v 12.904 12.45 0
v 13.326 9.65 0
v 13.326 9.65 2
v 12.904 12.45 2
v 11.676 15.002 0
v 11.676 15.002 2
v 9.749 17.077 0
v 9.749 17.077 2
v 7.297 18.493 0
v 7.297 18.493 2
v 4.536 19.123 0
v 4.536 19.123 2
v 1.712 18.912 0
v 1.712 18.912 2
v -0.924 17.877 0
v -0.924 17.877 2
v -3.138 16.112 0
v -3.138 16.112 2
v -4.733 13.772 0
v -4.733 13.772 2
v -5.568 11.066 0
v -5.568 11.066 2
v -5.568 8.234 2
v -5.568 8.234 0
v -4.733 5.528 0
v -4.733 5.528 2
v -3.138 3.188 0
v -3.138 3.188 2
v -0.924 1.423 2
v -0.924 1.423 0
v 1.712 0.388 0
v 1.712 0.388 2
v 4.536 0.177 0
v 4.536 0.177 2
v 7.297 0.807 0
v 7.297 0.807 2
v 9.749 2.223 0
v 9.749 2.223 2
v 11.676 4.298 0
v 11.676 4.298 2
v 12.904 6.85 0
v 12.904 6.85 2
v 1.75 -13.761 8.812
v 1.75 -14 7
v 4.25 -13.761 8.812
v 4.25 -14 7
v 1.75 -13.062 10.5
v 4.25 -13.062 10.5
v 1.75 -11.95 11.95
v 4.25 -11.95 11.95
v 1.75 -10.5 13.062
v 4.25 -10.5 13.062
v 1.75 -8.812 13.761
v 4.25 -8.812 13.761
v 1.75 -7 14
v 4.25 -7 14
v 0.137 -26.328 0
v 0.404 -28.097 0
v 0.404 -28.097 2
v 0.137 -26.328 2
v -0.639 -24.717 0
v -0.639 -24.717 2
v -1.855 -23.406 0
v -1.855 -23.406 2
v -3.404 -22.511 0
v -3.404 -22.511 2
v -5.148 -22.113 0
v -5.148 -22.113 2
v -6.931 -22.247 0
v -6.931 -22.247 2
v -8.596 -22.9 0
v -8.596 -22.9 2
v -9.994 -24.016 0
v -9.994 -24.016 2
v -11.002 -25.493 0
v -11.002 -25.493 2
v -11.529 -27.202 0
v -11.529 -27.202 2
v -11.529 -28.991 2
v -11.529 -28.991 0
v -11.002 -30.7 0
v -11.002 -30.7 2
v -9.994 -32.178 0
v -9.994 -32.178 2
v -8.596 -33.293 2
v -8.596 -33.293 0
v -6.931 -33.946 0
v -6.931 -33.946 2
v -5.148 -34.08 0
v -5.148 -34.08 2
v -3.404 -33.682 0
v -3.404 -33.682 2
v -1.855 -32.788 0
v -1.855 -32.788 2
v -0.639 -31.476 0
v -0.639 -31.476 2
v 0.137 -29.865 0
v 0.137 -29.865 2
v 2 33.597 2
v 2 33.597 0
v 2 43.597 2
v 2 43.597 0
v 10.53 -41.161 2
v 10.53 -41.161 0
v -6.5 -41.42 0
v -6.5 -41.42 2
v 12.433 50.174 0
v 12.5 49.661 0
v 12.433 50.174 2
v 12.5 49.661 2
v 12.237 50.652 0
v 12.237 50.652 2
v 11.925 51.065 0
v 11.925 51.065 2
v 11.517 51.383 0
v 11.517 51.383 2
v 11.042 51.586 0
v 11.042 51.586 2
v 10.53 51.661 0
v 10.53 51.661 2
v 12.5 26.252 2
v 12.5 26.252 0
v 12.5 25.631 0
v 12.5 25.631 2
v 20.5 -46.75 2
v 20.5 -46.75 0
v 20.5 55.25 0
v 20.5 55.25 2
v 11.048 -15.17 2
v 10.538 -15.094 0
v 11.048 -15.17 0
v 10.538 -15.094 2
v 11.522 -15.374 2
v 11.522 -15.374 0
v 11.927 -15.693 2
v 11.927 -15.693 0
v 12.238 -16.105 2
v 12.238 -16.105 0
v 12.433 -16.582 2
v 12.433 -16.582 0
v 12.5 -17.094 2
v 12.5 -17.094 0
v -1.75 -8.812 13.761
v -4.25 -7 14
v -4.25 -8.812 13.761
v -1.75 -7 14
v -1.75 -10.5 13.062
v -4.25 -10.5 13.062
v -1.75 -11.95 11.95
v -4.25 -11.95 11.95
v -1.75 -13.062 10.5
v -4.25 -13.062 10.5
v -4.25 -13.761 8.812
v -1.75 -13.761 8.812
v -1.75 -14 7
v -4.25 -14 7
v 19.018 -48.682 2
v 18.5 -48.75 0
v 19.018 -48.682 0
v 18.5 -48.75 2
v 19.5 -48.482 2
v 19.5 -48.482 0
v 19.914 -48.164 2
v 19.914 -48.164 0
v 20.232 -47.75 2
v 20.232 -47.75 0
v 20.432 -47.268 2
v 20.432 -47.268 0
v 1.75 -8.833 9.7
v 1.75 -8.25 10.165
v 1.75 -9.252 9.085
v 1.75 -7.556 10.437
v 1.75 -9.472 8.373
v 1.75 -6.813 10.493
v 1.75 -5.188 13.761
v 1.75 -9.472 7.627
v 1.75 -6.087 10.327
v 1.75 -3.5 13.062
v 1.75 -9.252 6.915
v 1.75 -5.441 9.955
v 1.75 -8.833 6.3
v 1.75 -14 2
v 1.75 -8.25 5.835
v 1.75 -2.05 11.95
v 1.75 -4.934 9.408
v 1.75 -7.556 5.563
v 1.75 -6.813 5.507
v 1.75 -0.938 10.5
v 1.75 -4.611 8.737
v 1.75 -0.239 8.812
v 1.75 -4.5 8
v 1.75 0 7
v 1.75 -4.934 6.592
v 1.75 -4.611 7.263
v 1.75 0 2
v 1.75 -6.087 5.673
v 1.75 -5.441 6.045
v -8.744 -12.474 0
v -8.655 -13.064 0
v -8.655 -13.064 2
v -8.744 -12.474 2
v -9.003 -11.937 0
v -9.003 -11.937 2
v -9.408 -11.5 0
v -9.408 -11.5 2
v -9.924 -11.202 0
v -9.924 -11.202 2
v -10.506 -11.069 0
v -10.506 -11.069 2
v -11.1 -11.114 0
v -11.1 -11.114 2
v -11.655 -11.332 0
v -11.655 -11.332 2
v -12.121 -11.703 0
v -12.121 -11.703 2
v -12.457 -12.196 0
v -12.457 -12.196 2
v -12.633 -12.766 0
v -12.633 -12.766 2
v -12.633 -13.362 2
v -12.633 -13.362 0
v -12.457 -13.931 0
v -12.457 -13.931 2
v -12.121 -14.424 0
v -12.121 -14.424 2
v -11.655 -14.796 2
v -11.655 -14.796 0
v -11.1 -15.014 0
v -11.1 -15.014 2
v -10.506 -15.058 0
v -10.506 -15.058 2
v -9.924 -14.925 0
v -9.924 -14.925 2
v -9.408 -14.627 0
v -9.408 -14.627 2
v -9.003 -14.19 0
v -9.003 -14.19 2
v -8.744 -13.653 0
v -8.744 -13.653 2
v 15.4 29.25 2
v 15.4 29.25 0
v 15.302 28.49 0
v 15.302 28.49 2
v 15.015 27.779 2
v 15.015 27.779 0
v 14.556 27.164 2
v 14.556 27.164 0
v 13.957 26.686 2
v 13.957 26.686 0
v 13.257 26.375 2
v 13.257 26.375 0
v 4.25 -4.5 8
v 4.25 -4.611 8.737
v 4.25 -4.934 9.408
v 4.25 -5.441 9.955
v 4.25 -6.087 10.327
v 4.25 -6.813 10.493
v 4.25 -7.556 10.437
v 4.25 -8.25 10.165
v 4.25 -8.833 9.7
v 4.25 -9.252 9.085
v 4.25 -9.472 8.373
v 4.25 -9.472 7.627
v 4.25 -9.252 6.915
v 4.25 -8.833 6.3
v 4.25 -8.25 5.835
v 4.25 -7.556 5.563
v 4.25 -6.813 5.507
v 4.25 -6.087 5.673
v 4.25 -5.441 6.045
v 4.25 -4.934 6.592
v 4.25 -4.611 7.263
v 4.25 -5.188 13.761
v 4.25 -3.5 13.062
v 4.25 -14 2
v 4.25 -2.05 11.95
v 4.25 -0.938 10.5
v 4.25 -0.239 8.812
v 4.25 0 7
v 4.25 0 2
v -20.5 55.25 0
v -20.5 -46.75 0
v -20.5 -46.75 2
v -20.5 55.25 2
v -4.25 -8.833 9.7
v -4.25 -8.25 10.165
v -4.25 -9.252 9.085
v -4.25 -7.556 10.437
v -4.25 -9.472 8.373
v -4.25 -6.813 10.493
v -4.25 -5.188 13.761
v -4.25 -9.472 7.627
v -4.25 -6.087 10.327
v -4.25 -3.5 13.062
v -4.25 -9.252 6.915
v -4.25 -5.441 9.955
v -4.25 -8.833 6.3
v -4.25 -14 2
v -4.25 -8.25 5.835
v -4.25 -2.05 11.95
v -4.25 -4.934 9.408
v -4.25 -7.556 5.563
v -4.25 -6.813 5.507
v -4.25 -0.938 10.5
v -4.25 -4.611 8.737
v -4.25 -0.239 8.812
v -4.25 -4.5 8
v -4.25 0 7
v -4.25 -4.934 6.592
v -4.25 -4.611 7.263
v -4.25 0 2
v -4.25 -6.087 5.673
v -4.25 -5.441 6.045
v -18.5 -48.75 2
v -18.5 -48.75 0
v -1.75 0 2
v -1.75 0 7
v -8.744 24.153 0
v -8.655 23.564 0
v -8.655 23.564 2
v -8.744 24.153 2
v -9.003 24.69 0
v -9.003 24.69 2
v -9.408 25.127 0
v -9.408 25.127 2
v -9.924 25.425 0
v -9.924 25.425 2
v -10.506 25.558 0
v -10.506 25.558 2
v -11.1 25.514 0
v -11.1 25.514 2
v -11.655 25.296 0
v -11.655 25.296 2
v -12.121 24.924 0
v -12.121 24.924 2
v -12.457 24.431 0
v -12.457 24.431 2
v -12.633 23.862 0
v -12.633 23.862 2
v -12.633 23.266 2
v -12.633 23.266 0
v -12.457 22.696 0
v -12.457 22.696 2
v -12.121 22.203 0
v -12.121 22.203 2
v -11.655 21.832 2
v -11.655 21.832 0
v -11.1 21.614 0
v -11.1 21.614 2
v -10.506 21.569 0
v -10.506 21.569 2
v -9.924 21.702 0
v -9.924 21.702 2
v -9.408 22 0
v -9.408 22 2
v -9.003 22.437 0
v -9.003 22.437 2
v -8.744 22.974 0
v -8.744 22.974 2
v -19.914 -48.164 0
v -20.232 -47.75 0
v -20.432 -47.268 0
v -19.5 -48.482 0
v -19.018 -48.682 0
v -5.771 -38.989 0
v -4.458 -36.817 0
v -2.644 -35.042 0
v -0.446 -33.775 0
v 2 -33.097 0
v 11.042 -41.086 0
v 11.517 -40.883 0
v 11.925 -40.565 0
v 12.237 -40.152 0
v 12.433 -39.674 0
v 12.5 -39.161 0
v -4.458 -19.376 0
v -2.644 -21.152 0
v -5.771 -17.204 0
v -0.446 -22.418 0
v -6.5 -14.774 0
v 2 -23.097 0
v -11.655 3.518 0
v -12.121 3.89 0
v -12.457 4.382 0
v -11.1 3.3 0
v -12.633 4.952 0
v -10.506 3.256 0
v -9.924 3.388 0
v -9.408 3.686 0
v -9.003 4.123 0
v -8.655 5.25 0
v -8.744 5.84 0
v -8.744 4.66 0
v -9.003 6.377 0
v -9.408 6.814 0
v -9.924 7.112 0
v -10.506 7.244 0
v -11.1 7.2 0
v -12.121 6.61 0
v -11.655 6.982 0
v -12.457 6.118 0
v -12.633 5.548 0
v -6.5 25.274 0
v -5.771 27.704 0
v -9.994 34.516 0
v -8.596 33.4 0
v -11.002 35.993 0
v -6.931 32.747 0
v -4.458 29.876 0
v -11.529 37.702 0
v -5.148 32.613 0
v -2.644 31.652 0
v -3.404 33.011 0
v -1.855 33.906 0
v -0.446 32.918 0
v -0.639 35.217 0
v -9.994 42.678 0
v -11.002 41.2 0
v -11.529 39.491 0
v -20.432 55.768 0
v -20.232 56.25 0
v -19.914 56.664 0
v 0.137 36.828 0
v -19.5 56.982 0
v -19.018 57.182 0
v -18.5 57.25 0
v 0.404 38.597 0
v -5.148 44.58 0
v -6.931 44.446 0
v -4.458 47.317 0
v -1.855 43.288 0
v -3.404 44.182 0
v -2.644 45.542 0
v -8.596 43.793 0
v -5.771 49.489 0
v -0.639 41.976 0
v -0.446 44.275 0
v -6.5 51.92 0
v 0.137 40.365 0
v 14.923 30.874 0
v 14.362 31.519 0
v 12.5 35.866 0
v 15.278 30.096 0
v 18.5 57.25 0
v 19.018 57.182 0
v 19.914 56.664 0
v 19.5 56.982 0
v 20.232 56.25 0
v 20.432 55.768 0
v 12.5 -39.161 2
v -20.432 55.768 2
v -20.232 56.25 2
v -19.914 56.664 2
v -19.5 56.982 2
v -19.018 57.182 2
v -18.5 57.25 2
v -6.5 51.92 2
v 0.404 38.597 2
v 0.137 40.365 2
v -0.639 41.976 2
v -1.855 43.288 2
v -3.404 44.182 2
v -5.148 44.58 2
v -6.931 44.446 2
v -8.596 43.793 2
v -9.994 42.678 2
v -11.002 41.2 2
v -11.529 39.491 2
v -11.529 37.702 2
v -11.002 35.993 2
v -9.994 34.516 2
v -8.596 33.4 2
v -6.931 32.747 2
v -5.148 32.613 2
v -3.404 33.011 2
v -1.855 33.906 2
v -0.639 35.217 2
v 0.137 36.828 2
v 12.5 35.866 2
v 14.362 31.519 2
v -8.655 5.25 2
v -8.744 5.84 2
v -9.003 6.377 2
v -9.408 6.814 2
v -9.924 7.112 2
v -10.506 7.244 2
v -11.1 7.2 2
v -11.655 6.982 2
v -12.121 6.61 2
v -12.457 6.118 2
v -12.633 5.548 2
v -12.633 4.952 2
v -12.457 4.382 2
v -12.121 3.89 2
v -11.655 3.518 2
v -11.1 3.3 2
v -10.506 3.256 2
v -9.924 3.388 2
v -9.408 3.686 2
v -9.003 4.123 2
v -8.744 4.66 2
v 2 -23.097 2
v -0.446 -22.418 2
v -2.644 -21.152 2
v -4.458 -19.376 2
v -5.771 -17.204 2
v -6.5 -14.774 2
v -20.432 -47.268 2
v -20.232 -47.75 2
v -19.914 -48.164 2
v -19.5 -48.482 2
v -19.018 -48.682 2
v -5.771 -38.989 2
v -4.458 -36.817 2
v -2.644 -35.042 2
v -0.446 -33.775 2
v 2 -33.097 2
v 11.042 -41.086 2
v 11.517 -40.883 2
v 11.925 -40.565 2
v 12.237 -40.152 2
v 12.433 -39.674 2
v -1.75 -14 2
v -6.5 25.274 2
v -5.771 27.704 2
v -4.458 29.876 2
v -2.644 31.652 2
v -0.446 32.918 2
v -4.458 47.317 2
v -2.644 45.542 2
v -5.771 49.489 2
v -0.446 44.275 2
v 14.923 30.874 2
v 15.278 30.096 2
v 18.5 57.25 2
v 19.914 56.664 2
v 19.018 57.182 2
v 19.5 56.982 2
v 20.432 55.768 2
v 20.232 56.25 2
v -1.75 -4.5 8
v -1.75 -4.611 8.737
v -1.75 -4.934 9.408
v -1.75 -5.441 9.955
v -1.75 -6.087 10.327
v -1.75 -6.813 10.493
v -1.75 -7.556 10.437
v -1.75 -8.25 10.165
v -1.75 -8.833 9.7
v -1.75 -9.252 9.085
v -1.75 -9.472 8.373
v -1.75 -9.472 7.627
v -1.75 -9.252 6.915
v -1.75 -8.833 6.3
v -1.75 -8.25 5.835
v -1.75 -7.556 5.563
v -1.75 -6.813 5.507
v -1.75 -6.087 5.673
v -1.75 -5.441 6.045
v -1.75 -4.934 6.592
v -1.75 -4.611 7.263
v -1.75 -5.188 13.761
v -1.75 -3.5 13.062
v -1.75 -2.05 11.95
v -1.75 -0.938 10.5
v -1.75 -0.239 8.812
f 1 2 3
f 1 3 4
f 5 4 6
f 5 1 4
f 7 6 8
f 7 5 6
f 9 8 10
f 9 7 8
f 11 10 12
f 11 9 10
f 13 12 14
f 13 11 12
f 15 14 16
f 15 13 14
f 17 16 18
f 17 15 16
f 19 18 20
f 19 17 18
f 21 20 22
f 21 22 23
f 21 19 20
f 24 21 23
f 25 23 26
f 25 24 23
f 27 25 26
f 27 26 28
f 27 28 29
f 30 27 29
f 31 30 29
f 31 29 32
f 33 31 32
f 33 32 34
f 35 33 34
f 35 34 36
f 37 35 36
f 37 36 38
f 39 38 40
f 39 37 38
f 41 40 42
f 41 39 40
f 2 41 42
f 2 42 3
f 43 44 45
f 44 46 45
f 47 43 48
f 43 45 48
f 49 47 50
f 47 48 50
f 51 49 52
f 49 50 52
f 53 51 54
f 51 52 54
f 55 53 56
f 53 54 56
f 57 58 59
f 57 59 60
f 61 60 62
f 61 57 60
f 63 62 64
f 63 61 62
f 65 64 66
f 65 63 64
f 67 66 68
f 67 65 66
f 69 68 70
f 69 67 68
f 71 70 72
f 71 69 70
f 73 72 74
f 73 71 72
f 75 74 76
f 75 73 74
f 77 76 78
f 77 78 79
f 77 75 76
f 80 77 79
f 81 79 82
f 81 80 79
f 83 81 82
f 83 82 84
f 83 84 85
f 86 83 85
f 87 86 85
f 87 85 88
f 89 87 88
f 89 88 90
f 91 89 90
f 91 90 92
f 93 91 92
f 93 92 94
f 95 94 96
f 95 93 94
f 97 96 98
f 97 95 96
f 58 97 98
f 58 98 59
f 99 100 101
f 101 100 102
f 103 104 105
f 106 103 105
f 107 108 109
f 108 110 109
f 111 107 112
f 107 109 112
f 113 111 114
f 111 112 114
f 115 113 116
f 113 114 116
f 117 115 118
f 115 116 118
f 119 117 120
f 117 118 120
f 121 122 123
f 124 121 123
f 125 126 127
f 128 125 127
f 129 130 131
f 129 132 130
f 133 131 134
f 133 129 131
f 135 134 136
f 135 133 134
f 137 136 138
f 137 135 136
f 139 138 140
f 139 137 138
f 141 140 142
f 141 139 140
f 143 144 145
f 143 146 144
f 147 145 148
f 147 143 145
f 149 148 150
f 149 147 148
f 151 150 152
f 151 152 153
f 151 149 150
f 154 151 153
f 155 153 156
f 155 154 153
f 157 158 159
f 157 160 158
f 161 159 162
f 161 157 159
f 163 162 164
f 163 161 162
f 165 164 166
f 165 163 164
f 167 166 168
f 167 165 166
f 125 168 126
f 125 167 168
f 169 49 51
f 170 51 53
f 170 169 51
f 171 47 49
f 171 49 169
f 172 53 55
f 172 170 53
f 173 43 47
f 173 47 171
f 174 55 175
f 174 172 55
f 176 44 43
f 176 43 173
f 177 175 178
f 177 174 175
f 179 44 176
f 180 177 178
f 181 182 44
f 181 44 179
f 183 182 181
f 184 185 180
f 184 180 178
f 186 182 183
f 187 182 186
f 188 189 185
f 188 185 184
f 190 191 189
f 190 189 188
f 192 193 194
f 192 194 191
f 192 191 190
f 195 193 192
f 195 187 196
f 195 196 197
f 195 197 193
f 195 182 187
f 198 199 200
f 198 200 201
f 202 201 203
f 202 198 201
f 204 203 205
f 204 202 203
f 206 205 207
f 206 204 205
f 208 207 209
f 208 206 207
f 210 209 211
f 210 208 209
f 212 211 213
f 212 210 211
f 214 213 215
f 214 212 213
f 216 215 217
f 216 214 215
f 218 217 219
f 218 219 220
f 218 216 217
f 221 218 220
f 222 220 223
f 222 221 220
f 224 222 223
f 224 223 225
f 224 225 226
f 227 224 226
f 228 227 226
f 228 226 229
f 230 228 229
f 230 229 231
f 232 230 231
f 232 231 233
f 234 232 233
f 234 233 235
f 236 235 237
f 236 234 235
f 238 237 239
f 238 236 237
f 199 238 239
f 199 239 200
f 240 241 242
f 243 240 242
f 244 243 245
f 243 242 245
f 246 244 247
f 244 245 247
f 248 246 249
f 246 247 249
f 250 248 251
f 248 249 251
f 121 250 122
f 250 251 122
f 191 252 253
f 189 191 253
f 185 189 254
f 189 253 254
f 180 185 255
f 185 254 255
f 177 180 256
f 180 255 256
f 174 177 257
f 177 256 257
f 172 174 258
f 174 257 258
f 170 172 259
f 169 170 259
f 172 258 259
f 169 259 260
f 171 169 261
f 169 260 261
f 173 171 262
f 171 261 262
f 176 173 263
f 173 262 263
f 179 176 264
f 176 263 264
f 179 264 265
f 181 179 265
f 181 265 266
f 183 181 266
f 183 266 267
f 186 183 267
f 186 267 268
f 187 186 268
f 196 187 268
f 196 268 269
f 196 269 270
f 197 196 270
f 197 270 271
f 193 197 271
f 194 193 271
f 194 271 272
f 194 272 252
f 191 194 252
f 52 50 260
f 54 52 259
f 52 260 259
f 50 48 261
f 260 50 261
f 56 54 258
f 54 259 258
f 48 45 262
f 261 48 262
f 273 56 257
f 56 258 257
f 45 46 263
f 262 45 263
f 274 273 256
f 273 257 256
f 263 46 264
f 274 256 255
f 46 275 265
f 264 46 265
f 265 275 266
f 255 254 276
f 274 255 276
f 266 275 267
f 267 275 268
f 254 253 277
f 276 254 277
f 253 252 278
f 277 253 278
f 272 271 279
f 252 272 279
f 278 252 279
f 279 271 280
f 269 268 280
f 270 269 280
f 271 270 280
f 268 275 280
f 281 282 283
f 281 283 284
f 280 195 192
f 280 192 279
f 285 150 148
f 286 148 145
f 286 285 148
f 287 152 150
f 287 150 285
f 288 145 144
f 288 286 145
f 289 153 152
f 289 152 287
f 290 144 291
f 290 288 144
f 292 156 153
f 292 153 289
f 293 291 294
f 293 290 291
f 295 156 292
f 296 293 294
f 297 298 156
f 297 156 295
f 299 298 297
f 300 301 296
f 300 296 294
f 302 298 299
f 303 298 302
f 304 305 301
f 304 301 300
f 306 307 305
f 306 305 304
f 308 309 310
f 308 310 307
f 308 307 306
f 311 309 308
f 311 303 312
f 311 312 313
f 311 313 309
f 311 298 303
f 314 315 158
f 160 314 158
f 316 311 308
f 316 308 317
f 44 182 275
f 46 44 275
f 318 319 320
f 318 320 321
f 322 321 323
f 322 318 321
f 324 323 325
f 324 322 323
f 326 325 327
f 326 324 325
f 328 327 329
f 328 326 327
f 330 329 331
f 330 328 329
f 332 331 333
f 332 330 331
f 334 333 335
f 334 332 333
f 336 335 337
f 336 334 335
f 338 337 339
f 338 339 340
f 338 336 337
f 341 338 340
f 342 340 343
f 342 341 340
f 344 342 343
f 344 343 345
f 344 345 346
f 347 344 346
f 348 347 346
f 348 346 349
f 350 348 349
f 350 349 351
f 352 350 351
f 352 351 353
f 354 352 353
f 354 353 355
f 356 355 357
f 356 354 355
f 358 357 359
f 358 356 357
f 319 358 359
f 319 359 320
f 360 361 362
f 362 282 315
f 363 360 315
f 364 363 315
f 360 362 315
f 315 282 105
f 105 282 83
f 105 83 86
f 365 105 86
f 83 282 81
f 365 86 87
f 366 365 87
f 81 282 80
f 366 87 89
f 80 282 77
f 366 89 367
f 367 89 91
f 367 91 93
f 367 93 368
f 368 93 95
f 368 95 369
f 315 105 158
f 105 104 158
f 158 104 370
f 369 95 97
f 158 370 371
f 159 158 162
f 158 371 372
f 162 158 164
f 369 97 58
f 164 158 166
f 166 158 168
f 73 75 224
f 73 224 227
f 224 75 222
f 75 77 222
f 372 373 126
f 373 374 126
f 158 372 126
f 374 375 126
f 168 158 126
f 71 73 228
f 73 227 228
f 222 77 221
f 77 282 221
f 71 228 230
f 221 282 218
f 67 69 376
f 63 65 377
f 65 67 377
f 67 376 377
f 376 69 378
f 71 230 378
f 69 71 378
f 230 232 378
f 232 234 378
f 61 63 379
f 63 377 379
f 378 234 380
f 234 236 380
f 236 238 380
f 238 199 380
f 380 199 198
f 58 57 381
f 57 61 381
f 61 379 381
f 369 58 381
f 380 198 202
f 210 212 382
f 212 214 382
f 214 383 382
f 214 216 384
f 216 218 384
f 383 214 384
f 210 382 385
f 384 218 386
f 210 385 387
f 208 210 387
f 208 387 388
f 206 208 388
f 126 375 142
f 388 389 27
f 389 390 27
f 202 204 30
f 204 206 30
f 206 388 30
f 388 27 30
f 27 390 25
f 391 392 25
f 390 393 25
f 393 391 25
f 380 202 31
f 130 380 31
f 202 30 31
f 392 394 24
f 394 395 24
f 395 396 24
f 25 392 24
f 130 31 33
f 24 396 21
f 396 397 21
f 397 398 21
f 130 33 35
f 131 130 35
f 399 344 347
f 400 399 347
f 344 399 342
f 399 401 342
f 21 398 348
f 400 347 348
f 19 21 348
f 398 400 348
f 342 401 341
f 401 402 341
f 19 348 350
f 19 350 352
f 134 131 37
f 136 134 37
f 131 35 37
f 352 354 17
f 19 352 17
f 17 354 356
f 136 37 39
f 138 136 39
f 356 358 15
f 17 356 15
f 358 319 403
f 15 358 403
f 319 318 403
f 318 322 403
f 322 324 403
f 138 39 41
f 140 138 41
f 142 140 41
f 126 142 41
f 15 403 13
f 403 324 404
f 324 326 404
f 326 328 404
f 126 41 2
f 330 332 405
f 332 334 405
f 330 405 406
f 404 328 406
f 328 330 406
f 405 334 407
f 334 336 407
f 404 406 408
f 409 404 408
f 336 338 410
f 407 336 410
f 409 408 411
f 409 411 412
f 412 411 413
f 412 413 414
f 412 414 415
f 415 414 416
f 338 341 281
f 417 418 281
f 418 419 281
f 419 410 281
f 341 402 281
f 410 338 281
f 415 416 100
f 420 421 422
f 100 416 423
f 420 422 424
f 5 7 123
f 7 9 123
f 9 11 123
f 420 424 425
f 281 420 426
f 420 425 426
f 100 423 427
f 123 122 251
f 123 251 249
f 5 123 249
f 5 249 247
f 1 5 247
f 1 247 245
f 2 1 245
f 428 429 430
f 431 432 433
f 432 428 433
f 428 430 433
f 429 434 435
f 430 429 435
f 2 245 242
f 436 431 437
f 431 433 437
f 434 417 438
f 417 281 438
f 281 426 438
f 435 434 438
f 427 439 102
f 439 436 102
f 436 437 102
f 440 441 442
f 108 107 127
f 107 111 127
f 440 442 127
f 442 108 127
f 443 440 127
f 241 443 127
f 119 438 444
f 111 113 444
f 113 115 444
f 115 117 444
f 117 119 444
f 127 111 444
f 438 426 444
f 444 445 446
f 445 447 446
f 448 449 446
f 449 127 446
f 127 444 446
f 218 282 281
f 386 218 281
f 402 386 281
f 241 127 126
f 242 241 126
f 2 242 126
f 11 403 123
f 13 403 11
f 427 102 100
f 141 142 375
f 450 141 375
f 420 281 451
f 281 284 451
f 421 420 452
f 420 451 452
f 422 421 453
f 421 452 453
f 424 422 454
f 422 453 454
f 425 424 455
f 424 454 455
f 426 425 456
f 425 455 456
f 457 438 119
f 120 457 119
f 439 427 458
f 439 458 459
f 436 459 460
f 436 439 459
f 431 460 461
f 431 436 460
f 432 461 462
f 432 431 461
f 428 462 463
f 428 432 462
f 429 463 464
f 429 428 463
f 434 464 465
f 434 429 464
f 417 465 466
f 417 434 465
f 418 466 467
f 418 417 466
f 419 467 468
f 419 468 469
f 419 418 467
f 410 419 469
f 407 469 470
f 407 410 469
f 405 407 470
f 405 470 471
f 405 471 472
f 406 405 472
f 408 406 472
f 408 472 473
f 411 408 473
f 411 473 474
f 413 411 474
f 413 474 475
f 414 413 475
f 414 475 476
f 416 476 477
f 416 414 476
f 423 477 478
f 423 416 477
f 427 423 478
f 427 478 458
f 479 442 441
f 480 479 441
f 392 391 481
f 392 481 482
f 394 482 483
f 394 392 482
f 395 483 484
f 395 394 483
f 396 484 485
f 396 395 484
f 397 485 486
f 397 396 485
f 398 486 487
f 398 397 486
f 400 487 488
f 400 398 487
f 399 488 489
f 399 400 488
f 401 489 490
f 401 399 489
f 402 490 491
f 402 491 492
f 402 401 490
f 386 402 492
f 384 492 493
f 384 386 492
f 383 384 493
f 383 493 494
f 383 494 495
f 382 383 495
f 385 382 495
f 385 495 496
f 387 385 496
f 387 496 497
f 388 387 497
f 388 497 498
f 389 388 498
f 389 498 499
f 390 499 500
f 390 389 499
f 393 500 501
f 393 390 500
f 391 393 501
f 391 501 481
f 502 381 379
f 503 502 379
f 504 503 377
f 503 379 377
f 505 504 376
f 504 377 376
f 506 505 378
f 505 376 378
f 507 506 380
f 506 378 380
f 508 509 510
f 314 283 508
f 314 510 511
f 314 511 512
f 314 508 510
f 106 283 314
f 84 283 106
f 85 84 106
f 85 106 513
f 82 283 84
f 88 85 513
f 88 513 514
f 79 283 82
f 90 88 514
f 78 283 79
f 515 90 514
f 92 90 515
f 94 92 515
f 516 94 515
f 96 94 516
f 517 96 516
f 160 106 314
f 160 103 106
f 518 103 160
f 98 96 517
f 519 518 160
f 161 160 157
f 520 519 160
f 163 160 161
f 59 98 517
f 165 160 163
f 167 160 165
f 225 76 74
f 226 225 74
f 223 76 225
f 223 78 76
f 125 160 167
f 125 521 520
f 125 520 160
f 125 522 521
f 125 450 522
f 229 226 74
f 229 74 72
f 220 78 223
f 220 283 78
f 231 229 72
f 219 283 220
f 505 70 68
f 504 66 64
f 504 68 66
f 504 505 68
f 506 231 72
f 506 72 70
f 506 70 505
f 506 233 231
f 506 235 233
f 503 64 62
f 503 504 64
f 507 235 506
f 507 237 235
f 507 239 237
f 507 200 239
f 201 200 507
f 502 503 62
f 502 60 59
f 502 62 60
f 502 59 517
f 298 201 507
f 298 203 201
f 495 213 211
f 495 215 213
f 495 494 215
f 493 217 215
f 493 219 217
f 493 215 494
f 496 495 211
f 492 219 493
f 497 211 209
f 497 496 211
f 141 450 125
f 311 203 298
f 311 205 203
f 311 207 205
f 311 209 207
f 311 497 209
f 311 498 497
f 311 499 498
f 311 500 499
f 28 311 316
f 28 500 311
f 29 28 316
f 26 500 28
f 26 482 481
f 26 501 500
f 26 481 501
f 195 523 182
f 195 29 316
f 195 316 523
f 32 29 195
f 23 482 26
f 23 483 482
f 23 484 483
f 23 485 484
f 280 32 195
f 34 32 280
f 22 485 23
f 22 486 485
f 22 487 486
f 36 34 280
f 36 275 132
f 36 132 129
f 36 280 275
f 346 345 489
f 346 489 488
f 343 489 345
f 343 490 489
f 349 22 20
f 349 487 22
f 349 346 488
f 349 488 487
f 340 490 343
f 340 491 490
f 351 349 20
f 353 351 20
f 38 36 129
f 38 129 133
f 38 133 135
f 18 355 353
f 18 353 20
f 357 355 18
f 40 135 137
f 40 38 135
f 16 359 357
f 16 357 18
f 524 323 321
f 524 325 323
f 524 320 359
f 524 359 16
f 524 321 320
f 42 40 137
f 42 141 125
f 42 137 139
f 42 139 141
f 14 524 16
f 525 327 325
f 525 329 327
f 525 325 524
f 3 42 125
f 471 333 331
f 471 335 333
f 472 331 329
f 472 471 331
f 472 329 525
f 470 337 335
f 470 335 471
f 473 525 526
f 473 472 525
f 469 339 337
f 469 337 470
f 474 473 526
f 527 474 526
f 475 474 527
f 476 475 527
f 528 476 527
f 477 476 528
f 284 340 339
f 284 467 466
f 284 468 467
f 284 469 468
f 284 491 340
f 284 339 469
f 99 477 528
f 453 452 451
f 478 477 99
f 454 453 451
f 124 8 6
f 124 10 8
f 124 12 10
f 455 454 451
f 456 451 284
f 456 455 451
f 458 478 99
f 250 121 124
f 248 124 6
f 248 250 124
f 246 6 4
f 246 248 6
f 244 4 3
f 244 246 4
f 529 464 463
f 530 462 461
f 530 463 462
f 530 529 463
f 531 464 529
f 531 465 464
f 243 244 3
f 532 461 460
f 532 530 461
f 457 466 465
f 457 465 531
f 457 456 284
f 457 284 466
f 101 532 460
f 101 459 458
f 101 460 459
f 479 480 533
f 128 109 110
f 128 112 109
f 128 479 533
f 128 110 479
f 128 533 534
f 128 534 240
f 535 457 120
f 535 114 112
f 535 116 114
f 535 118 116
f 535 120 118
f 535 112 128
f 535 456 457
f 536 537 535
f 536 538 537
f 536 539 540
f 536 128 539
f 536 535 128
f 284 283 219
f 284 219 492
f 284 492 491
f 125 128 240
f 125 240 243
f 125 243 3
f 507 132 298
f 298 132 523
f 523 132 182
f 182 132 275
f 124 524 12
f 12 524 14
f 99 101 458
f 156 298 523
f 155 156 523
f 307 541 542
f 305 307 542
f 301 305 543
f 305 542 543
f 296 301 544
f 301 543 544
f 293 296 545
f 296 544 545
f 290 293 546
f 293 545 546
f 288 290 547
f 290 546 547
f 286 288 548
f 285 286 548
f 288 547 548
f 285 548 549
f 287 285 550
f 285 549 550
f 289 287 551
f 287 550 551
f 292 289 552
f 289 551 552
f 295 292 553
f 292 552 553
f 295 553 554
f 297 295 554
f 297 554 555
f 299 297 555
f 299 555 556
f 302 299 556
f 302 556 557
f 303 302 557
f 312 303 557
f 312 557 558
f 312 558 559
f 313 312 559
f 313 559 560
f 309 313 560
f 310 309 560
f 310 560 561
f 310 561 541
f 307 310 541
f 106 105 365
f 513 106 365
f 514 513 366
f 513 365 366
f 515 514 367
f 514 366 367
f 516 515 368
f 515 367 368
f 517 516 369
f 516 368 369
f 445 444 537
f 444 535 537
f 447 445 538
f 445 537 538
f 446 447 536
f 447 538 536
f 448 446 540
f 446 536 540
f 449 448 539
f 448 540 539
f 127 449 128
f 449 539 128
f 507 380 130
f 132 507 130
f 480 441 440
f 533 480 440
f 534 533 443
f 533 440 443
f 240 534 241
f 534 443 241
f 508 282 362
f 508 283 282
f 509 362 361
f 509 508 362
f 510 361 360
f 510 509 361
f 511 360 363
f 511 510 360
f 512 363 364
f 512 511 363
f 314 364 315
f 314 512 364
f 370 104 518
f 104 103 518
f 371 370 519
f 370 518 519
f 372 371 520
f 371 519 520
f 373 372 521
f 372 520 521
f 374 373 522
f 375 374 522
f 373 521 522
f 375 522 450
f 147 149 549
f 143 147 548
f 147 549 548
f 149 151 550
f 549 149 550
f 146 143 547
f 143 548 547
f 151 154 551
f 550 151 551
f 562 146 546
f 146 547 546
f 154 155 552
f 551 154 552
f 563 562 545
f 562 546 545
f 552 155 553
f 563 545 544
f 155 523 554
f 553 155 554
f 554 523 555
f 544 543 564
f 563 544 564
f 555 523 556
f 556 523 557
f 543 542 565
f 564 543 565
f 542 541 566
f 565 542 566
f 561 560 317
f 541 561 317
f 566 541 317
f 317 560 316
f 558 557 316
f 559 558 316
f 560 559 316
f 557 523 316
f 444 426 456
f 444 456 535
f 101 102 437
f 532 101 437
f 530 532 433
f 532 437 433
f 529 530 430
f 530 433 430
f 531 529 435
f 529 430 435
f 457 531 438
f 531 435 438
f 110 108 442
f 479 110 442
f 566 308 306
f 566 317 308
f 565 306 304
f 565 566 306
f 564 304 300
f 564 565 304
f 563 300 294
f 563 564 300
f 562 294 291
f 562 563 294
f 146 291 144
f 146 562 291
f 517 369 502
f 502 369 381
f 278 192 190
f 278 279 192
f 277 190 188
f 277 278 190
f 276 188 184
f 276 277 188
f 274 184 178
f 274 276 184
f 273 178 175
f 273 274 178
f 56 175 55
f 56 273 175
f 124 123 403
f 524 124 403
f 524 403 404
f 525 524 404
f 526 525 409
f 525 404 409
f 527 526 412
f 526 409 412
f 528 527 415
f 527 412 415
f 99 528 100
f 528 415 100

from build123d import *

# Parameters (mm, degrees)
F0_W     = 41
F0_H     = 106
F0_R     = 6
F0_R_2   = 2
F0_W_2   = 2.5
F0_H_2   = 14
F0_R_3   = 9.5
F1_DEPTH = 2
F2_R     = 2
F3_DEPTH = 14
F4_R     = 6.99999
F5_R     = 2.5
F6_DEPTH = 25


# Not quite as in the source:
# - a fillet or chamfer is up to 0.001 mm smaller than in the source, because OpenCascade refuses the exact size


with BuildPart() as f1:
    # F0 (on Top) → F1 (new body)
    with BuildSketch(Plane.XY):
        with Locations((0, 4.2499956787)):
            Rectangle(F0_W, F0_H)
        with Locations((-5.5959895056, -28.0965764523)):
            Circle(F0_R, mode=Mode.SUBTRACT)
        with Locations((-10.6551818848, -13.0636913106)):
            Circle(F0_R_2, mode=Mode.SUBTRACT)
        with Locations((-3, -7)):
            Rectangle(F0_W_2, F0_H_2, mode=Mode.SUBTRACT)
        with BuildLine():
            ThreePointArc((2, -23.0965764523), (-3.6071540429, -20.3211082876), (-6.5, -14.7736005353))
            Line((-6.5, -14.7736005353), (12.5, -15.1310515412))
            Line((12.5, -15.1310515412), (12.5, -41.1310515412))
            Line((12.5, -41.1310515412), (-6.5, -41.4195523692))
            ThreePointArc((-6.5, -41.4195523692), (-3.6071540429, -35.8720446169), (2, -33.0965764523))
            Line((2, -33.0965764523), (2, -23.0965764523))
        make_face(mode=Mode.SUBTRACT)
        with Locations((3, -7)):
            Rectangle(F0_W_2, F0_H_2, mode=Mode.SUBTRACT)
        with Locations((-10.6551818848, 5.2499956787)):
            Circle(F0_R_2, mode=Mode.SUBTRACT)
        with Locations((-10.6551818848, 23.5636826679)):
            Circle(F0_R_2, mode=Mode.SUBTRACT)
        with Locations((-5.5959895056, 38.5965678096)):
            Circle(F0_R, mode=Mode.SUBTRACT)
        with Locations((3.8262721598, 9.6499956787)):
            Circle(F0_R_3, mode=Mode.SUBTRACT)
        with BuildLine():
            ThreePointArc((2, 43.5965678096), (-3.6071540429, 46.3720359742), (-6.5, 51.9195437265))
            Line((-6.5, 51.9195437265), (12.5, 51.6310428985))
            Line((12.5, 51.6310428985), (12.5, 35.8656205144))
            Line((12.5, 35.8656205144), (14.3622287411, 31.5192815504))
            ThreePointArc((14.3622287411, 31.5192815504), (15.1282490927, 30.4976562448), (15.4, 29.2499956787))
            ThreePointArc((15.4, 29.2499956787), (14.5563858653, 27.1643303172), (12.5, 26.2516628086))
            Line((12.5, 26.2516628086), (12.5, 25.6310428985))
            Line((12.5, 25.6310428985), (-6.5, 25.2735918926))
            ThreePointArc((-6.5, 25.2735918926), (-3.6071540429, 30.8210996449), (2, 33.5965678096))
            Line((2, 33.5965678096), (2, 43.5965678096))
        make_face(mode=Mode.SUBTRACT)
    extrude(amount=F1_DEPTH)

    # F2
    f2_edges = [f1.edges().sort_by_distance(p)[0] for p in [
        (20.5, -48.750004, 1),
        (-20.5, -48.750004, 1),
        (12.5, -15.131052, 1),
        (12.5, -41.131052, 1),
        (12.5, 51.631043, 1),
        (20.5, 57.249996, 1),
        (-20.5, 57.249996, 1),
    ]]
    fillet(f2_edges, radius=F2_R)

    # F0 (on Top) → F3 (join)
    with BuildSketch(Plane.XY):
        with Locations((-3, -7)):
            Rectangle(F0_W_2, F0_H_2)
        with Locations((3, -7)):
            Rectangle(F0_W_2, F0_H_2)
    extrude(amount=F3_DEPTH)

    # F4 (radius 7 in the source; OpenCascade refuses exactly that, so slightly less here)
    f4_edges = [f1.edges().sort_by_distance(p)[0] for p in [
        (3, 0, 14),
        (3, -14, 14),
        (-3, -14, 14),
        (-3, 0, 14),
    ]]
    fillet(f4_edges, radius=F4_R)

    # F5 (on face) → F6 (cut)
    with BuildSketch(Plane.YZ.offset(4.25)):
        with Locations((-7, 8)):
            Circle(F5_R)
    extrude(amount=-F6_DEPTH, mode=Mode.SUBTRACT)


solid = f1.part
